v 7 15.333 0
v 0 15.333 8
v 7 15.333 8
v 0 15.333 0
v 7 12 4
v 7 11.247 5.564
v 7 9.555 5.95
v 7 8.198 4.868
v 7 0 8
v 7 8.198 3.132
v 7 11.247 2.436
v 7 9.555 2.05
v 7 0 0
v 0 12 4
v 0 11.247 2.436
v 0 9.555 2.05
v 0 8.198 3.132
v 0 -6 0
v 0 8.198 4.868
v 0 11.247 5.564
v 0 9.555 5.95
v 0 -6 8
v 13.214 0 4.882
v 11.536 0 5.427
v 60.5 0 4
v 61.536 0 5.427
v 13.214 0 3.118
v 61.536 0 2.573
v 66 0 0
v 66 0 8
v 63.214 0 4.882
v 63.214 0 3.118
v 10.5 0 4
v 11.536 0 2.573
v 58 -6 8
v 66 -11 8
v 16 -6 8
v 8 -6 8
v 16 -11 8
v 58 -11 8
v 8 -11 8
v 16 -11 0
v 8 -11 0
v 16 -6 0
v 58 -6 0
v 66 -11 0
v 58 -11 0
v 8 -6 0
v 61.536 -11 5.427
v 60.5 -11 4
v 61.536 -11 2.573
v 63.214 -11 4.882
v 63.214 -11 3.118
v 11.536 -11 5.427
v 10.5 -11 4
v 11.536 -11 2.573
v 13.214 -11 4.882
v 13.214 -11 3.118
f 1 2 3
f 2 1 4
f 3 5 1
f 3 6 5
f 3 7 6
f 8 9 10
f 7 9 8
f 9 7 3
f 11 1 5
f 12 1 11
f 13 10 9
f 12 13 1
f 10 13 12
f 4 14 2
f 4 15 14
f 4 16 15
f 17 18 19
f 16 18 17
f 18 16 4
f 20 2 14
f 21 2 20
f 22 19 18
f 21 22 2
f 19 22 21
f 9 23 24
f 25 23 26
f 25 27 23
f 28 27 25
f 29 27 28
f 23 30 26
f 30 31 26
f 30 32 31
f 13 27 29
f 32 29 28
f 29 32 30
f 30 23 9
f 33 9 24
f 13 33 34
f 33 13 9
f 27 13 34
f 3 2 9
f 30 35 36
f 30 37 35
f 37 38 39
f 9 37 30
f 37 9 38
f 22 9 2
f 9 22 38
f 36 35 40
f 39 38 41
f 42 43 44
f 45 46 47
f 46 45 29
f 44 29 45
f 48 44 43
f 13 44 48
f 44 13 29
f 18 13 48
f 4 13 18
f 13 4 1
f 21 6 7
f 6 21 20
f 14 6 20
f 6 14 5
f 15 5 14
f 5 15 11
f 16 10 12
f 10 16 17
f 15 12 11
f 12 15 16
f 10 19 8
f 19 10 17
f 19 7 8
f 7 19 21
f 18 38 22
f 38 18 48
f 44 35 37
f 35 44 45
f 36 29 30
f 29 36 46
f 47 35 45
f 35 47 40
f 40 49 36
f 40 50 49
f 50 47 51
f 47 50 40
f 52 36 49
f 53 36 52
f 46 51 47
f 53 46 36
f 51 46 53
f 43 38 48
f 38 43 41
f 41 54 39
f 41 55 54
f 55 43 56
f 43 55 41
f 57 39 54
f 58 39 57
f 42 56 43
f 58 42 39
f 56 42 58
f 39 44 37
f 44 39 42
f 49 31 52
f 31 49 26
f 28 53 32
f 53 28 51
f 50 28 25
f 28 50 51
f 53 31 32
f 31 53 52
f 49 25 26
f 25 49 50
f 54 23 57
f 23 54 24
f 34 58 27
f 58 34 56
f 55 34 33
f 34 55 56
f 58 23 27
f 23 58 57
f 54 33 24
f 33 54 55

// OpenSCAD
/* globals */
gWidth     =  8;

/* top piece */

tHoleSpace = 10;
tHoleSize  =  4;
tHeight    =  7;
tWidth     =  gWidth;
tOver      =  6;
tLength    = tHoleSpace + tWidth * (2/3);

//translate([0,-tOver,0])
rotate(a=90,v=[0,0,1])
rotate(a=90,v=[1,0,0])

difference() {
    
    // create bar
    cube([tLength,tWidth,tHeight]);
    
    // create hole
    translate([tHoleSpace,tWidth/2,0])
    cylinder(d=tHoleSize, h=tHeight);
}


/* end top piece */

/* vertical piece */

vOffset    =  8; 
vWidth     =  gWidth;
vBarHeight =  6;
padHeight  =  5;
vHoleSpace = 50;
vLength    = vHoleSpace + vWidth + vOffset;
vHoleSize  =  3;

// flip to side
translate([vLength,0,vWidth]) {
rotate(a=180,v=[0,0,1]) {
rotate(a=-90,v=[1,0,0]) {
    
    // subtract holes from bar
    difference() {
        
        // create bar
        union() {
            // main bar
            cube([vLength,vWidth,vBarHeight]);
            
            // top pad
            translate([0,0,vBarHeight])
            cube([vWidth,vWidth,padHeight]);
            
            // bottom pad
            translate([vLength-vWidth-vOffset,0,vBarHeight])
            cube([vWidth,vWidth,padHeight]);
        } // end create bar
        
        // create holes
        union() {
            // top hole
            translate([vWidth/2,vWidth/2,0])
            cylinder(d=vHoleSize,h=vBarHeight+padHeight);

            // bottom hole
            translate([vLength-(vWidth/2)-vOffset,vWidth/2,0])
            cylinder(d=vHoleSize,h=vBarHeight+padHeight);
        } // end holes
        
    } // end difference
    
} } // end rotate
}

/* end vertical piece */
